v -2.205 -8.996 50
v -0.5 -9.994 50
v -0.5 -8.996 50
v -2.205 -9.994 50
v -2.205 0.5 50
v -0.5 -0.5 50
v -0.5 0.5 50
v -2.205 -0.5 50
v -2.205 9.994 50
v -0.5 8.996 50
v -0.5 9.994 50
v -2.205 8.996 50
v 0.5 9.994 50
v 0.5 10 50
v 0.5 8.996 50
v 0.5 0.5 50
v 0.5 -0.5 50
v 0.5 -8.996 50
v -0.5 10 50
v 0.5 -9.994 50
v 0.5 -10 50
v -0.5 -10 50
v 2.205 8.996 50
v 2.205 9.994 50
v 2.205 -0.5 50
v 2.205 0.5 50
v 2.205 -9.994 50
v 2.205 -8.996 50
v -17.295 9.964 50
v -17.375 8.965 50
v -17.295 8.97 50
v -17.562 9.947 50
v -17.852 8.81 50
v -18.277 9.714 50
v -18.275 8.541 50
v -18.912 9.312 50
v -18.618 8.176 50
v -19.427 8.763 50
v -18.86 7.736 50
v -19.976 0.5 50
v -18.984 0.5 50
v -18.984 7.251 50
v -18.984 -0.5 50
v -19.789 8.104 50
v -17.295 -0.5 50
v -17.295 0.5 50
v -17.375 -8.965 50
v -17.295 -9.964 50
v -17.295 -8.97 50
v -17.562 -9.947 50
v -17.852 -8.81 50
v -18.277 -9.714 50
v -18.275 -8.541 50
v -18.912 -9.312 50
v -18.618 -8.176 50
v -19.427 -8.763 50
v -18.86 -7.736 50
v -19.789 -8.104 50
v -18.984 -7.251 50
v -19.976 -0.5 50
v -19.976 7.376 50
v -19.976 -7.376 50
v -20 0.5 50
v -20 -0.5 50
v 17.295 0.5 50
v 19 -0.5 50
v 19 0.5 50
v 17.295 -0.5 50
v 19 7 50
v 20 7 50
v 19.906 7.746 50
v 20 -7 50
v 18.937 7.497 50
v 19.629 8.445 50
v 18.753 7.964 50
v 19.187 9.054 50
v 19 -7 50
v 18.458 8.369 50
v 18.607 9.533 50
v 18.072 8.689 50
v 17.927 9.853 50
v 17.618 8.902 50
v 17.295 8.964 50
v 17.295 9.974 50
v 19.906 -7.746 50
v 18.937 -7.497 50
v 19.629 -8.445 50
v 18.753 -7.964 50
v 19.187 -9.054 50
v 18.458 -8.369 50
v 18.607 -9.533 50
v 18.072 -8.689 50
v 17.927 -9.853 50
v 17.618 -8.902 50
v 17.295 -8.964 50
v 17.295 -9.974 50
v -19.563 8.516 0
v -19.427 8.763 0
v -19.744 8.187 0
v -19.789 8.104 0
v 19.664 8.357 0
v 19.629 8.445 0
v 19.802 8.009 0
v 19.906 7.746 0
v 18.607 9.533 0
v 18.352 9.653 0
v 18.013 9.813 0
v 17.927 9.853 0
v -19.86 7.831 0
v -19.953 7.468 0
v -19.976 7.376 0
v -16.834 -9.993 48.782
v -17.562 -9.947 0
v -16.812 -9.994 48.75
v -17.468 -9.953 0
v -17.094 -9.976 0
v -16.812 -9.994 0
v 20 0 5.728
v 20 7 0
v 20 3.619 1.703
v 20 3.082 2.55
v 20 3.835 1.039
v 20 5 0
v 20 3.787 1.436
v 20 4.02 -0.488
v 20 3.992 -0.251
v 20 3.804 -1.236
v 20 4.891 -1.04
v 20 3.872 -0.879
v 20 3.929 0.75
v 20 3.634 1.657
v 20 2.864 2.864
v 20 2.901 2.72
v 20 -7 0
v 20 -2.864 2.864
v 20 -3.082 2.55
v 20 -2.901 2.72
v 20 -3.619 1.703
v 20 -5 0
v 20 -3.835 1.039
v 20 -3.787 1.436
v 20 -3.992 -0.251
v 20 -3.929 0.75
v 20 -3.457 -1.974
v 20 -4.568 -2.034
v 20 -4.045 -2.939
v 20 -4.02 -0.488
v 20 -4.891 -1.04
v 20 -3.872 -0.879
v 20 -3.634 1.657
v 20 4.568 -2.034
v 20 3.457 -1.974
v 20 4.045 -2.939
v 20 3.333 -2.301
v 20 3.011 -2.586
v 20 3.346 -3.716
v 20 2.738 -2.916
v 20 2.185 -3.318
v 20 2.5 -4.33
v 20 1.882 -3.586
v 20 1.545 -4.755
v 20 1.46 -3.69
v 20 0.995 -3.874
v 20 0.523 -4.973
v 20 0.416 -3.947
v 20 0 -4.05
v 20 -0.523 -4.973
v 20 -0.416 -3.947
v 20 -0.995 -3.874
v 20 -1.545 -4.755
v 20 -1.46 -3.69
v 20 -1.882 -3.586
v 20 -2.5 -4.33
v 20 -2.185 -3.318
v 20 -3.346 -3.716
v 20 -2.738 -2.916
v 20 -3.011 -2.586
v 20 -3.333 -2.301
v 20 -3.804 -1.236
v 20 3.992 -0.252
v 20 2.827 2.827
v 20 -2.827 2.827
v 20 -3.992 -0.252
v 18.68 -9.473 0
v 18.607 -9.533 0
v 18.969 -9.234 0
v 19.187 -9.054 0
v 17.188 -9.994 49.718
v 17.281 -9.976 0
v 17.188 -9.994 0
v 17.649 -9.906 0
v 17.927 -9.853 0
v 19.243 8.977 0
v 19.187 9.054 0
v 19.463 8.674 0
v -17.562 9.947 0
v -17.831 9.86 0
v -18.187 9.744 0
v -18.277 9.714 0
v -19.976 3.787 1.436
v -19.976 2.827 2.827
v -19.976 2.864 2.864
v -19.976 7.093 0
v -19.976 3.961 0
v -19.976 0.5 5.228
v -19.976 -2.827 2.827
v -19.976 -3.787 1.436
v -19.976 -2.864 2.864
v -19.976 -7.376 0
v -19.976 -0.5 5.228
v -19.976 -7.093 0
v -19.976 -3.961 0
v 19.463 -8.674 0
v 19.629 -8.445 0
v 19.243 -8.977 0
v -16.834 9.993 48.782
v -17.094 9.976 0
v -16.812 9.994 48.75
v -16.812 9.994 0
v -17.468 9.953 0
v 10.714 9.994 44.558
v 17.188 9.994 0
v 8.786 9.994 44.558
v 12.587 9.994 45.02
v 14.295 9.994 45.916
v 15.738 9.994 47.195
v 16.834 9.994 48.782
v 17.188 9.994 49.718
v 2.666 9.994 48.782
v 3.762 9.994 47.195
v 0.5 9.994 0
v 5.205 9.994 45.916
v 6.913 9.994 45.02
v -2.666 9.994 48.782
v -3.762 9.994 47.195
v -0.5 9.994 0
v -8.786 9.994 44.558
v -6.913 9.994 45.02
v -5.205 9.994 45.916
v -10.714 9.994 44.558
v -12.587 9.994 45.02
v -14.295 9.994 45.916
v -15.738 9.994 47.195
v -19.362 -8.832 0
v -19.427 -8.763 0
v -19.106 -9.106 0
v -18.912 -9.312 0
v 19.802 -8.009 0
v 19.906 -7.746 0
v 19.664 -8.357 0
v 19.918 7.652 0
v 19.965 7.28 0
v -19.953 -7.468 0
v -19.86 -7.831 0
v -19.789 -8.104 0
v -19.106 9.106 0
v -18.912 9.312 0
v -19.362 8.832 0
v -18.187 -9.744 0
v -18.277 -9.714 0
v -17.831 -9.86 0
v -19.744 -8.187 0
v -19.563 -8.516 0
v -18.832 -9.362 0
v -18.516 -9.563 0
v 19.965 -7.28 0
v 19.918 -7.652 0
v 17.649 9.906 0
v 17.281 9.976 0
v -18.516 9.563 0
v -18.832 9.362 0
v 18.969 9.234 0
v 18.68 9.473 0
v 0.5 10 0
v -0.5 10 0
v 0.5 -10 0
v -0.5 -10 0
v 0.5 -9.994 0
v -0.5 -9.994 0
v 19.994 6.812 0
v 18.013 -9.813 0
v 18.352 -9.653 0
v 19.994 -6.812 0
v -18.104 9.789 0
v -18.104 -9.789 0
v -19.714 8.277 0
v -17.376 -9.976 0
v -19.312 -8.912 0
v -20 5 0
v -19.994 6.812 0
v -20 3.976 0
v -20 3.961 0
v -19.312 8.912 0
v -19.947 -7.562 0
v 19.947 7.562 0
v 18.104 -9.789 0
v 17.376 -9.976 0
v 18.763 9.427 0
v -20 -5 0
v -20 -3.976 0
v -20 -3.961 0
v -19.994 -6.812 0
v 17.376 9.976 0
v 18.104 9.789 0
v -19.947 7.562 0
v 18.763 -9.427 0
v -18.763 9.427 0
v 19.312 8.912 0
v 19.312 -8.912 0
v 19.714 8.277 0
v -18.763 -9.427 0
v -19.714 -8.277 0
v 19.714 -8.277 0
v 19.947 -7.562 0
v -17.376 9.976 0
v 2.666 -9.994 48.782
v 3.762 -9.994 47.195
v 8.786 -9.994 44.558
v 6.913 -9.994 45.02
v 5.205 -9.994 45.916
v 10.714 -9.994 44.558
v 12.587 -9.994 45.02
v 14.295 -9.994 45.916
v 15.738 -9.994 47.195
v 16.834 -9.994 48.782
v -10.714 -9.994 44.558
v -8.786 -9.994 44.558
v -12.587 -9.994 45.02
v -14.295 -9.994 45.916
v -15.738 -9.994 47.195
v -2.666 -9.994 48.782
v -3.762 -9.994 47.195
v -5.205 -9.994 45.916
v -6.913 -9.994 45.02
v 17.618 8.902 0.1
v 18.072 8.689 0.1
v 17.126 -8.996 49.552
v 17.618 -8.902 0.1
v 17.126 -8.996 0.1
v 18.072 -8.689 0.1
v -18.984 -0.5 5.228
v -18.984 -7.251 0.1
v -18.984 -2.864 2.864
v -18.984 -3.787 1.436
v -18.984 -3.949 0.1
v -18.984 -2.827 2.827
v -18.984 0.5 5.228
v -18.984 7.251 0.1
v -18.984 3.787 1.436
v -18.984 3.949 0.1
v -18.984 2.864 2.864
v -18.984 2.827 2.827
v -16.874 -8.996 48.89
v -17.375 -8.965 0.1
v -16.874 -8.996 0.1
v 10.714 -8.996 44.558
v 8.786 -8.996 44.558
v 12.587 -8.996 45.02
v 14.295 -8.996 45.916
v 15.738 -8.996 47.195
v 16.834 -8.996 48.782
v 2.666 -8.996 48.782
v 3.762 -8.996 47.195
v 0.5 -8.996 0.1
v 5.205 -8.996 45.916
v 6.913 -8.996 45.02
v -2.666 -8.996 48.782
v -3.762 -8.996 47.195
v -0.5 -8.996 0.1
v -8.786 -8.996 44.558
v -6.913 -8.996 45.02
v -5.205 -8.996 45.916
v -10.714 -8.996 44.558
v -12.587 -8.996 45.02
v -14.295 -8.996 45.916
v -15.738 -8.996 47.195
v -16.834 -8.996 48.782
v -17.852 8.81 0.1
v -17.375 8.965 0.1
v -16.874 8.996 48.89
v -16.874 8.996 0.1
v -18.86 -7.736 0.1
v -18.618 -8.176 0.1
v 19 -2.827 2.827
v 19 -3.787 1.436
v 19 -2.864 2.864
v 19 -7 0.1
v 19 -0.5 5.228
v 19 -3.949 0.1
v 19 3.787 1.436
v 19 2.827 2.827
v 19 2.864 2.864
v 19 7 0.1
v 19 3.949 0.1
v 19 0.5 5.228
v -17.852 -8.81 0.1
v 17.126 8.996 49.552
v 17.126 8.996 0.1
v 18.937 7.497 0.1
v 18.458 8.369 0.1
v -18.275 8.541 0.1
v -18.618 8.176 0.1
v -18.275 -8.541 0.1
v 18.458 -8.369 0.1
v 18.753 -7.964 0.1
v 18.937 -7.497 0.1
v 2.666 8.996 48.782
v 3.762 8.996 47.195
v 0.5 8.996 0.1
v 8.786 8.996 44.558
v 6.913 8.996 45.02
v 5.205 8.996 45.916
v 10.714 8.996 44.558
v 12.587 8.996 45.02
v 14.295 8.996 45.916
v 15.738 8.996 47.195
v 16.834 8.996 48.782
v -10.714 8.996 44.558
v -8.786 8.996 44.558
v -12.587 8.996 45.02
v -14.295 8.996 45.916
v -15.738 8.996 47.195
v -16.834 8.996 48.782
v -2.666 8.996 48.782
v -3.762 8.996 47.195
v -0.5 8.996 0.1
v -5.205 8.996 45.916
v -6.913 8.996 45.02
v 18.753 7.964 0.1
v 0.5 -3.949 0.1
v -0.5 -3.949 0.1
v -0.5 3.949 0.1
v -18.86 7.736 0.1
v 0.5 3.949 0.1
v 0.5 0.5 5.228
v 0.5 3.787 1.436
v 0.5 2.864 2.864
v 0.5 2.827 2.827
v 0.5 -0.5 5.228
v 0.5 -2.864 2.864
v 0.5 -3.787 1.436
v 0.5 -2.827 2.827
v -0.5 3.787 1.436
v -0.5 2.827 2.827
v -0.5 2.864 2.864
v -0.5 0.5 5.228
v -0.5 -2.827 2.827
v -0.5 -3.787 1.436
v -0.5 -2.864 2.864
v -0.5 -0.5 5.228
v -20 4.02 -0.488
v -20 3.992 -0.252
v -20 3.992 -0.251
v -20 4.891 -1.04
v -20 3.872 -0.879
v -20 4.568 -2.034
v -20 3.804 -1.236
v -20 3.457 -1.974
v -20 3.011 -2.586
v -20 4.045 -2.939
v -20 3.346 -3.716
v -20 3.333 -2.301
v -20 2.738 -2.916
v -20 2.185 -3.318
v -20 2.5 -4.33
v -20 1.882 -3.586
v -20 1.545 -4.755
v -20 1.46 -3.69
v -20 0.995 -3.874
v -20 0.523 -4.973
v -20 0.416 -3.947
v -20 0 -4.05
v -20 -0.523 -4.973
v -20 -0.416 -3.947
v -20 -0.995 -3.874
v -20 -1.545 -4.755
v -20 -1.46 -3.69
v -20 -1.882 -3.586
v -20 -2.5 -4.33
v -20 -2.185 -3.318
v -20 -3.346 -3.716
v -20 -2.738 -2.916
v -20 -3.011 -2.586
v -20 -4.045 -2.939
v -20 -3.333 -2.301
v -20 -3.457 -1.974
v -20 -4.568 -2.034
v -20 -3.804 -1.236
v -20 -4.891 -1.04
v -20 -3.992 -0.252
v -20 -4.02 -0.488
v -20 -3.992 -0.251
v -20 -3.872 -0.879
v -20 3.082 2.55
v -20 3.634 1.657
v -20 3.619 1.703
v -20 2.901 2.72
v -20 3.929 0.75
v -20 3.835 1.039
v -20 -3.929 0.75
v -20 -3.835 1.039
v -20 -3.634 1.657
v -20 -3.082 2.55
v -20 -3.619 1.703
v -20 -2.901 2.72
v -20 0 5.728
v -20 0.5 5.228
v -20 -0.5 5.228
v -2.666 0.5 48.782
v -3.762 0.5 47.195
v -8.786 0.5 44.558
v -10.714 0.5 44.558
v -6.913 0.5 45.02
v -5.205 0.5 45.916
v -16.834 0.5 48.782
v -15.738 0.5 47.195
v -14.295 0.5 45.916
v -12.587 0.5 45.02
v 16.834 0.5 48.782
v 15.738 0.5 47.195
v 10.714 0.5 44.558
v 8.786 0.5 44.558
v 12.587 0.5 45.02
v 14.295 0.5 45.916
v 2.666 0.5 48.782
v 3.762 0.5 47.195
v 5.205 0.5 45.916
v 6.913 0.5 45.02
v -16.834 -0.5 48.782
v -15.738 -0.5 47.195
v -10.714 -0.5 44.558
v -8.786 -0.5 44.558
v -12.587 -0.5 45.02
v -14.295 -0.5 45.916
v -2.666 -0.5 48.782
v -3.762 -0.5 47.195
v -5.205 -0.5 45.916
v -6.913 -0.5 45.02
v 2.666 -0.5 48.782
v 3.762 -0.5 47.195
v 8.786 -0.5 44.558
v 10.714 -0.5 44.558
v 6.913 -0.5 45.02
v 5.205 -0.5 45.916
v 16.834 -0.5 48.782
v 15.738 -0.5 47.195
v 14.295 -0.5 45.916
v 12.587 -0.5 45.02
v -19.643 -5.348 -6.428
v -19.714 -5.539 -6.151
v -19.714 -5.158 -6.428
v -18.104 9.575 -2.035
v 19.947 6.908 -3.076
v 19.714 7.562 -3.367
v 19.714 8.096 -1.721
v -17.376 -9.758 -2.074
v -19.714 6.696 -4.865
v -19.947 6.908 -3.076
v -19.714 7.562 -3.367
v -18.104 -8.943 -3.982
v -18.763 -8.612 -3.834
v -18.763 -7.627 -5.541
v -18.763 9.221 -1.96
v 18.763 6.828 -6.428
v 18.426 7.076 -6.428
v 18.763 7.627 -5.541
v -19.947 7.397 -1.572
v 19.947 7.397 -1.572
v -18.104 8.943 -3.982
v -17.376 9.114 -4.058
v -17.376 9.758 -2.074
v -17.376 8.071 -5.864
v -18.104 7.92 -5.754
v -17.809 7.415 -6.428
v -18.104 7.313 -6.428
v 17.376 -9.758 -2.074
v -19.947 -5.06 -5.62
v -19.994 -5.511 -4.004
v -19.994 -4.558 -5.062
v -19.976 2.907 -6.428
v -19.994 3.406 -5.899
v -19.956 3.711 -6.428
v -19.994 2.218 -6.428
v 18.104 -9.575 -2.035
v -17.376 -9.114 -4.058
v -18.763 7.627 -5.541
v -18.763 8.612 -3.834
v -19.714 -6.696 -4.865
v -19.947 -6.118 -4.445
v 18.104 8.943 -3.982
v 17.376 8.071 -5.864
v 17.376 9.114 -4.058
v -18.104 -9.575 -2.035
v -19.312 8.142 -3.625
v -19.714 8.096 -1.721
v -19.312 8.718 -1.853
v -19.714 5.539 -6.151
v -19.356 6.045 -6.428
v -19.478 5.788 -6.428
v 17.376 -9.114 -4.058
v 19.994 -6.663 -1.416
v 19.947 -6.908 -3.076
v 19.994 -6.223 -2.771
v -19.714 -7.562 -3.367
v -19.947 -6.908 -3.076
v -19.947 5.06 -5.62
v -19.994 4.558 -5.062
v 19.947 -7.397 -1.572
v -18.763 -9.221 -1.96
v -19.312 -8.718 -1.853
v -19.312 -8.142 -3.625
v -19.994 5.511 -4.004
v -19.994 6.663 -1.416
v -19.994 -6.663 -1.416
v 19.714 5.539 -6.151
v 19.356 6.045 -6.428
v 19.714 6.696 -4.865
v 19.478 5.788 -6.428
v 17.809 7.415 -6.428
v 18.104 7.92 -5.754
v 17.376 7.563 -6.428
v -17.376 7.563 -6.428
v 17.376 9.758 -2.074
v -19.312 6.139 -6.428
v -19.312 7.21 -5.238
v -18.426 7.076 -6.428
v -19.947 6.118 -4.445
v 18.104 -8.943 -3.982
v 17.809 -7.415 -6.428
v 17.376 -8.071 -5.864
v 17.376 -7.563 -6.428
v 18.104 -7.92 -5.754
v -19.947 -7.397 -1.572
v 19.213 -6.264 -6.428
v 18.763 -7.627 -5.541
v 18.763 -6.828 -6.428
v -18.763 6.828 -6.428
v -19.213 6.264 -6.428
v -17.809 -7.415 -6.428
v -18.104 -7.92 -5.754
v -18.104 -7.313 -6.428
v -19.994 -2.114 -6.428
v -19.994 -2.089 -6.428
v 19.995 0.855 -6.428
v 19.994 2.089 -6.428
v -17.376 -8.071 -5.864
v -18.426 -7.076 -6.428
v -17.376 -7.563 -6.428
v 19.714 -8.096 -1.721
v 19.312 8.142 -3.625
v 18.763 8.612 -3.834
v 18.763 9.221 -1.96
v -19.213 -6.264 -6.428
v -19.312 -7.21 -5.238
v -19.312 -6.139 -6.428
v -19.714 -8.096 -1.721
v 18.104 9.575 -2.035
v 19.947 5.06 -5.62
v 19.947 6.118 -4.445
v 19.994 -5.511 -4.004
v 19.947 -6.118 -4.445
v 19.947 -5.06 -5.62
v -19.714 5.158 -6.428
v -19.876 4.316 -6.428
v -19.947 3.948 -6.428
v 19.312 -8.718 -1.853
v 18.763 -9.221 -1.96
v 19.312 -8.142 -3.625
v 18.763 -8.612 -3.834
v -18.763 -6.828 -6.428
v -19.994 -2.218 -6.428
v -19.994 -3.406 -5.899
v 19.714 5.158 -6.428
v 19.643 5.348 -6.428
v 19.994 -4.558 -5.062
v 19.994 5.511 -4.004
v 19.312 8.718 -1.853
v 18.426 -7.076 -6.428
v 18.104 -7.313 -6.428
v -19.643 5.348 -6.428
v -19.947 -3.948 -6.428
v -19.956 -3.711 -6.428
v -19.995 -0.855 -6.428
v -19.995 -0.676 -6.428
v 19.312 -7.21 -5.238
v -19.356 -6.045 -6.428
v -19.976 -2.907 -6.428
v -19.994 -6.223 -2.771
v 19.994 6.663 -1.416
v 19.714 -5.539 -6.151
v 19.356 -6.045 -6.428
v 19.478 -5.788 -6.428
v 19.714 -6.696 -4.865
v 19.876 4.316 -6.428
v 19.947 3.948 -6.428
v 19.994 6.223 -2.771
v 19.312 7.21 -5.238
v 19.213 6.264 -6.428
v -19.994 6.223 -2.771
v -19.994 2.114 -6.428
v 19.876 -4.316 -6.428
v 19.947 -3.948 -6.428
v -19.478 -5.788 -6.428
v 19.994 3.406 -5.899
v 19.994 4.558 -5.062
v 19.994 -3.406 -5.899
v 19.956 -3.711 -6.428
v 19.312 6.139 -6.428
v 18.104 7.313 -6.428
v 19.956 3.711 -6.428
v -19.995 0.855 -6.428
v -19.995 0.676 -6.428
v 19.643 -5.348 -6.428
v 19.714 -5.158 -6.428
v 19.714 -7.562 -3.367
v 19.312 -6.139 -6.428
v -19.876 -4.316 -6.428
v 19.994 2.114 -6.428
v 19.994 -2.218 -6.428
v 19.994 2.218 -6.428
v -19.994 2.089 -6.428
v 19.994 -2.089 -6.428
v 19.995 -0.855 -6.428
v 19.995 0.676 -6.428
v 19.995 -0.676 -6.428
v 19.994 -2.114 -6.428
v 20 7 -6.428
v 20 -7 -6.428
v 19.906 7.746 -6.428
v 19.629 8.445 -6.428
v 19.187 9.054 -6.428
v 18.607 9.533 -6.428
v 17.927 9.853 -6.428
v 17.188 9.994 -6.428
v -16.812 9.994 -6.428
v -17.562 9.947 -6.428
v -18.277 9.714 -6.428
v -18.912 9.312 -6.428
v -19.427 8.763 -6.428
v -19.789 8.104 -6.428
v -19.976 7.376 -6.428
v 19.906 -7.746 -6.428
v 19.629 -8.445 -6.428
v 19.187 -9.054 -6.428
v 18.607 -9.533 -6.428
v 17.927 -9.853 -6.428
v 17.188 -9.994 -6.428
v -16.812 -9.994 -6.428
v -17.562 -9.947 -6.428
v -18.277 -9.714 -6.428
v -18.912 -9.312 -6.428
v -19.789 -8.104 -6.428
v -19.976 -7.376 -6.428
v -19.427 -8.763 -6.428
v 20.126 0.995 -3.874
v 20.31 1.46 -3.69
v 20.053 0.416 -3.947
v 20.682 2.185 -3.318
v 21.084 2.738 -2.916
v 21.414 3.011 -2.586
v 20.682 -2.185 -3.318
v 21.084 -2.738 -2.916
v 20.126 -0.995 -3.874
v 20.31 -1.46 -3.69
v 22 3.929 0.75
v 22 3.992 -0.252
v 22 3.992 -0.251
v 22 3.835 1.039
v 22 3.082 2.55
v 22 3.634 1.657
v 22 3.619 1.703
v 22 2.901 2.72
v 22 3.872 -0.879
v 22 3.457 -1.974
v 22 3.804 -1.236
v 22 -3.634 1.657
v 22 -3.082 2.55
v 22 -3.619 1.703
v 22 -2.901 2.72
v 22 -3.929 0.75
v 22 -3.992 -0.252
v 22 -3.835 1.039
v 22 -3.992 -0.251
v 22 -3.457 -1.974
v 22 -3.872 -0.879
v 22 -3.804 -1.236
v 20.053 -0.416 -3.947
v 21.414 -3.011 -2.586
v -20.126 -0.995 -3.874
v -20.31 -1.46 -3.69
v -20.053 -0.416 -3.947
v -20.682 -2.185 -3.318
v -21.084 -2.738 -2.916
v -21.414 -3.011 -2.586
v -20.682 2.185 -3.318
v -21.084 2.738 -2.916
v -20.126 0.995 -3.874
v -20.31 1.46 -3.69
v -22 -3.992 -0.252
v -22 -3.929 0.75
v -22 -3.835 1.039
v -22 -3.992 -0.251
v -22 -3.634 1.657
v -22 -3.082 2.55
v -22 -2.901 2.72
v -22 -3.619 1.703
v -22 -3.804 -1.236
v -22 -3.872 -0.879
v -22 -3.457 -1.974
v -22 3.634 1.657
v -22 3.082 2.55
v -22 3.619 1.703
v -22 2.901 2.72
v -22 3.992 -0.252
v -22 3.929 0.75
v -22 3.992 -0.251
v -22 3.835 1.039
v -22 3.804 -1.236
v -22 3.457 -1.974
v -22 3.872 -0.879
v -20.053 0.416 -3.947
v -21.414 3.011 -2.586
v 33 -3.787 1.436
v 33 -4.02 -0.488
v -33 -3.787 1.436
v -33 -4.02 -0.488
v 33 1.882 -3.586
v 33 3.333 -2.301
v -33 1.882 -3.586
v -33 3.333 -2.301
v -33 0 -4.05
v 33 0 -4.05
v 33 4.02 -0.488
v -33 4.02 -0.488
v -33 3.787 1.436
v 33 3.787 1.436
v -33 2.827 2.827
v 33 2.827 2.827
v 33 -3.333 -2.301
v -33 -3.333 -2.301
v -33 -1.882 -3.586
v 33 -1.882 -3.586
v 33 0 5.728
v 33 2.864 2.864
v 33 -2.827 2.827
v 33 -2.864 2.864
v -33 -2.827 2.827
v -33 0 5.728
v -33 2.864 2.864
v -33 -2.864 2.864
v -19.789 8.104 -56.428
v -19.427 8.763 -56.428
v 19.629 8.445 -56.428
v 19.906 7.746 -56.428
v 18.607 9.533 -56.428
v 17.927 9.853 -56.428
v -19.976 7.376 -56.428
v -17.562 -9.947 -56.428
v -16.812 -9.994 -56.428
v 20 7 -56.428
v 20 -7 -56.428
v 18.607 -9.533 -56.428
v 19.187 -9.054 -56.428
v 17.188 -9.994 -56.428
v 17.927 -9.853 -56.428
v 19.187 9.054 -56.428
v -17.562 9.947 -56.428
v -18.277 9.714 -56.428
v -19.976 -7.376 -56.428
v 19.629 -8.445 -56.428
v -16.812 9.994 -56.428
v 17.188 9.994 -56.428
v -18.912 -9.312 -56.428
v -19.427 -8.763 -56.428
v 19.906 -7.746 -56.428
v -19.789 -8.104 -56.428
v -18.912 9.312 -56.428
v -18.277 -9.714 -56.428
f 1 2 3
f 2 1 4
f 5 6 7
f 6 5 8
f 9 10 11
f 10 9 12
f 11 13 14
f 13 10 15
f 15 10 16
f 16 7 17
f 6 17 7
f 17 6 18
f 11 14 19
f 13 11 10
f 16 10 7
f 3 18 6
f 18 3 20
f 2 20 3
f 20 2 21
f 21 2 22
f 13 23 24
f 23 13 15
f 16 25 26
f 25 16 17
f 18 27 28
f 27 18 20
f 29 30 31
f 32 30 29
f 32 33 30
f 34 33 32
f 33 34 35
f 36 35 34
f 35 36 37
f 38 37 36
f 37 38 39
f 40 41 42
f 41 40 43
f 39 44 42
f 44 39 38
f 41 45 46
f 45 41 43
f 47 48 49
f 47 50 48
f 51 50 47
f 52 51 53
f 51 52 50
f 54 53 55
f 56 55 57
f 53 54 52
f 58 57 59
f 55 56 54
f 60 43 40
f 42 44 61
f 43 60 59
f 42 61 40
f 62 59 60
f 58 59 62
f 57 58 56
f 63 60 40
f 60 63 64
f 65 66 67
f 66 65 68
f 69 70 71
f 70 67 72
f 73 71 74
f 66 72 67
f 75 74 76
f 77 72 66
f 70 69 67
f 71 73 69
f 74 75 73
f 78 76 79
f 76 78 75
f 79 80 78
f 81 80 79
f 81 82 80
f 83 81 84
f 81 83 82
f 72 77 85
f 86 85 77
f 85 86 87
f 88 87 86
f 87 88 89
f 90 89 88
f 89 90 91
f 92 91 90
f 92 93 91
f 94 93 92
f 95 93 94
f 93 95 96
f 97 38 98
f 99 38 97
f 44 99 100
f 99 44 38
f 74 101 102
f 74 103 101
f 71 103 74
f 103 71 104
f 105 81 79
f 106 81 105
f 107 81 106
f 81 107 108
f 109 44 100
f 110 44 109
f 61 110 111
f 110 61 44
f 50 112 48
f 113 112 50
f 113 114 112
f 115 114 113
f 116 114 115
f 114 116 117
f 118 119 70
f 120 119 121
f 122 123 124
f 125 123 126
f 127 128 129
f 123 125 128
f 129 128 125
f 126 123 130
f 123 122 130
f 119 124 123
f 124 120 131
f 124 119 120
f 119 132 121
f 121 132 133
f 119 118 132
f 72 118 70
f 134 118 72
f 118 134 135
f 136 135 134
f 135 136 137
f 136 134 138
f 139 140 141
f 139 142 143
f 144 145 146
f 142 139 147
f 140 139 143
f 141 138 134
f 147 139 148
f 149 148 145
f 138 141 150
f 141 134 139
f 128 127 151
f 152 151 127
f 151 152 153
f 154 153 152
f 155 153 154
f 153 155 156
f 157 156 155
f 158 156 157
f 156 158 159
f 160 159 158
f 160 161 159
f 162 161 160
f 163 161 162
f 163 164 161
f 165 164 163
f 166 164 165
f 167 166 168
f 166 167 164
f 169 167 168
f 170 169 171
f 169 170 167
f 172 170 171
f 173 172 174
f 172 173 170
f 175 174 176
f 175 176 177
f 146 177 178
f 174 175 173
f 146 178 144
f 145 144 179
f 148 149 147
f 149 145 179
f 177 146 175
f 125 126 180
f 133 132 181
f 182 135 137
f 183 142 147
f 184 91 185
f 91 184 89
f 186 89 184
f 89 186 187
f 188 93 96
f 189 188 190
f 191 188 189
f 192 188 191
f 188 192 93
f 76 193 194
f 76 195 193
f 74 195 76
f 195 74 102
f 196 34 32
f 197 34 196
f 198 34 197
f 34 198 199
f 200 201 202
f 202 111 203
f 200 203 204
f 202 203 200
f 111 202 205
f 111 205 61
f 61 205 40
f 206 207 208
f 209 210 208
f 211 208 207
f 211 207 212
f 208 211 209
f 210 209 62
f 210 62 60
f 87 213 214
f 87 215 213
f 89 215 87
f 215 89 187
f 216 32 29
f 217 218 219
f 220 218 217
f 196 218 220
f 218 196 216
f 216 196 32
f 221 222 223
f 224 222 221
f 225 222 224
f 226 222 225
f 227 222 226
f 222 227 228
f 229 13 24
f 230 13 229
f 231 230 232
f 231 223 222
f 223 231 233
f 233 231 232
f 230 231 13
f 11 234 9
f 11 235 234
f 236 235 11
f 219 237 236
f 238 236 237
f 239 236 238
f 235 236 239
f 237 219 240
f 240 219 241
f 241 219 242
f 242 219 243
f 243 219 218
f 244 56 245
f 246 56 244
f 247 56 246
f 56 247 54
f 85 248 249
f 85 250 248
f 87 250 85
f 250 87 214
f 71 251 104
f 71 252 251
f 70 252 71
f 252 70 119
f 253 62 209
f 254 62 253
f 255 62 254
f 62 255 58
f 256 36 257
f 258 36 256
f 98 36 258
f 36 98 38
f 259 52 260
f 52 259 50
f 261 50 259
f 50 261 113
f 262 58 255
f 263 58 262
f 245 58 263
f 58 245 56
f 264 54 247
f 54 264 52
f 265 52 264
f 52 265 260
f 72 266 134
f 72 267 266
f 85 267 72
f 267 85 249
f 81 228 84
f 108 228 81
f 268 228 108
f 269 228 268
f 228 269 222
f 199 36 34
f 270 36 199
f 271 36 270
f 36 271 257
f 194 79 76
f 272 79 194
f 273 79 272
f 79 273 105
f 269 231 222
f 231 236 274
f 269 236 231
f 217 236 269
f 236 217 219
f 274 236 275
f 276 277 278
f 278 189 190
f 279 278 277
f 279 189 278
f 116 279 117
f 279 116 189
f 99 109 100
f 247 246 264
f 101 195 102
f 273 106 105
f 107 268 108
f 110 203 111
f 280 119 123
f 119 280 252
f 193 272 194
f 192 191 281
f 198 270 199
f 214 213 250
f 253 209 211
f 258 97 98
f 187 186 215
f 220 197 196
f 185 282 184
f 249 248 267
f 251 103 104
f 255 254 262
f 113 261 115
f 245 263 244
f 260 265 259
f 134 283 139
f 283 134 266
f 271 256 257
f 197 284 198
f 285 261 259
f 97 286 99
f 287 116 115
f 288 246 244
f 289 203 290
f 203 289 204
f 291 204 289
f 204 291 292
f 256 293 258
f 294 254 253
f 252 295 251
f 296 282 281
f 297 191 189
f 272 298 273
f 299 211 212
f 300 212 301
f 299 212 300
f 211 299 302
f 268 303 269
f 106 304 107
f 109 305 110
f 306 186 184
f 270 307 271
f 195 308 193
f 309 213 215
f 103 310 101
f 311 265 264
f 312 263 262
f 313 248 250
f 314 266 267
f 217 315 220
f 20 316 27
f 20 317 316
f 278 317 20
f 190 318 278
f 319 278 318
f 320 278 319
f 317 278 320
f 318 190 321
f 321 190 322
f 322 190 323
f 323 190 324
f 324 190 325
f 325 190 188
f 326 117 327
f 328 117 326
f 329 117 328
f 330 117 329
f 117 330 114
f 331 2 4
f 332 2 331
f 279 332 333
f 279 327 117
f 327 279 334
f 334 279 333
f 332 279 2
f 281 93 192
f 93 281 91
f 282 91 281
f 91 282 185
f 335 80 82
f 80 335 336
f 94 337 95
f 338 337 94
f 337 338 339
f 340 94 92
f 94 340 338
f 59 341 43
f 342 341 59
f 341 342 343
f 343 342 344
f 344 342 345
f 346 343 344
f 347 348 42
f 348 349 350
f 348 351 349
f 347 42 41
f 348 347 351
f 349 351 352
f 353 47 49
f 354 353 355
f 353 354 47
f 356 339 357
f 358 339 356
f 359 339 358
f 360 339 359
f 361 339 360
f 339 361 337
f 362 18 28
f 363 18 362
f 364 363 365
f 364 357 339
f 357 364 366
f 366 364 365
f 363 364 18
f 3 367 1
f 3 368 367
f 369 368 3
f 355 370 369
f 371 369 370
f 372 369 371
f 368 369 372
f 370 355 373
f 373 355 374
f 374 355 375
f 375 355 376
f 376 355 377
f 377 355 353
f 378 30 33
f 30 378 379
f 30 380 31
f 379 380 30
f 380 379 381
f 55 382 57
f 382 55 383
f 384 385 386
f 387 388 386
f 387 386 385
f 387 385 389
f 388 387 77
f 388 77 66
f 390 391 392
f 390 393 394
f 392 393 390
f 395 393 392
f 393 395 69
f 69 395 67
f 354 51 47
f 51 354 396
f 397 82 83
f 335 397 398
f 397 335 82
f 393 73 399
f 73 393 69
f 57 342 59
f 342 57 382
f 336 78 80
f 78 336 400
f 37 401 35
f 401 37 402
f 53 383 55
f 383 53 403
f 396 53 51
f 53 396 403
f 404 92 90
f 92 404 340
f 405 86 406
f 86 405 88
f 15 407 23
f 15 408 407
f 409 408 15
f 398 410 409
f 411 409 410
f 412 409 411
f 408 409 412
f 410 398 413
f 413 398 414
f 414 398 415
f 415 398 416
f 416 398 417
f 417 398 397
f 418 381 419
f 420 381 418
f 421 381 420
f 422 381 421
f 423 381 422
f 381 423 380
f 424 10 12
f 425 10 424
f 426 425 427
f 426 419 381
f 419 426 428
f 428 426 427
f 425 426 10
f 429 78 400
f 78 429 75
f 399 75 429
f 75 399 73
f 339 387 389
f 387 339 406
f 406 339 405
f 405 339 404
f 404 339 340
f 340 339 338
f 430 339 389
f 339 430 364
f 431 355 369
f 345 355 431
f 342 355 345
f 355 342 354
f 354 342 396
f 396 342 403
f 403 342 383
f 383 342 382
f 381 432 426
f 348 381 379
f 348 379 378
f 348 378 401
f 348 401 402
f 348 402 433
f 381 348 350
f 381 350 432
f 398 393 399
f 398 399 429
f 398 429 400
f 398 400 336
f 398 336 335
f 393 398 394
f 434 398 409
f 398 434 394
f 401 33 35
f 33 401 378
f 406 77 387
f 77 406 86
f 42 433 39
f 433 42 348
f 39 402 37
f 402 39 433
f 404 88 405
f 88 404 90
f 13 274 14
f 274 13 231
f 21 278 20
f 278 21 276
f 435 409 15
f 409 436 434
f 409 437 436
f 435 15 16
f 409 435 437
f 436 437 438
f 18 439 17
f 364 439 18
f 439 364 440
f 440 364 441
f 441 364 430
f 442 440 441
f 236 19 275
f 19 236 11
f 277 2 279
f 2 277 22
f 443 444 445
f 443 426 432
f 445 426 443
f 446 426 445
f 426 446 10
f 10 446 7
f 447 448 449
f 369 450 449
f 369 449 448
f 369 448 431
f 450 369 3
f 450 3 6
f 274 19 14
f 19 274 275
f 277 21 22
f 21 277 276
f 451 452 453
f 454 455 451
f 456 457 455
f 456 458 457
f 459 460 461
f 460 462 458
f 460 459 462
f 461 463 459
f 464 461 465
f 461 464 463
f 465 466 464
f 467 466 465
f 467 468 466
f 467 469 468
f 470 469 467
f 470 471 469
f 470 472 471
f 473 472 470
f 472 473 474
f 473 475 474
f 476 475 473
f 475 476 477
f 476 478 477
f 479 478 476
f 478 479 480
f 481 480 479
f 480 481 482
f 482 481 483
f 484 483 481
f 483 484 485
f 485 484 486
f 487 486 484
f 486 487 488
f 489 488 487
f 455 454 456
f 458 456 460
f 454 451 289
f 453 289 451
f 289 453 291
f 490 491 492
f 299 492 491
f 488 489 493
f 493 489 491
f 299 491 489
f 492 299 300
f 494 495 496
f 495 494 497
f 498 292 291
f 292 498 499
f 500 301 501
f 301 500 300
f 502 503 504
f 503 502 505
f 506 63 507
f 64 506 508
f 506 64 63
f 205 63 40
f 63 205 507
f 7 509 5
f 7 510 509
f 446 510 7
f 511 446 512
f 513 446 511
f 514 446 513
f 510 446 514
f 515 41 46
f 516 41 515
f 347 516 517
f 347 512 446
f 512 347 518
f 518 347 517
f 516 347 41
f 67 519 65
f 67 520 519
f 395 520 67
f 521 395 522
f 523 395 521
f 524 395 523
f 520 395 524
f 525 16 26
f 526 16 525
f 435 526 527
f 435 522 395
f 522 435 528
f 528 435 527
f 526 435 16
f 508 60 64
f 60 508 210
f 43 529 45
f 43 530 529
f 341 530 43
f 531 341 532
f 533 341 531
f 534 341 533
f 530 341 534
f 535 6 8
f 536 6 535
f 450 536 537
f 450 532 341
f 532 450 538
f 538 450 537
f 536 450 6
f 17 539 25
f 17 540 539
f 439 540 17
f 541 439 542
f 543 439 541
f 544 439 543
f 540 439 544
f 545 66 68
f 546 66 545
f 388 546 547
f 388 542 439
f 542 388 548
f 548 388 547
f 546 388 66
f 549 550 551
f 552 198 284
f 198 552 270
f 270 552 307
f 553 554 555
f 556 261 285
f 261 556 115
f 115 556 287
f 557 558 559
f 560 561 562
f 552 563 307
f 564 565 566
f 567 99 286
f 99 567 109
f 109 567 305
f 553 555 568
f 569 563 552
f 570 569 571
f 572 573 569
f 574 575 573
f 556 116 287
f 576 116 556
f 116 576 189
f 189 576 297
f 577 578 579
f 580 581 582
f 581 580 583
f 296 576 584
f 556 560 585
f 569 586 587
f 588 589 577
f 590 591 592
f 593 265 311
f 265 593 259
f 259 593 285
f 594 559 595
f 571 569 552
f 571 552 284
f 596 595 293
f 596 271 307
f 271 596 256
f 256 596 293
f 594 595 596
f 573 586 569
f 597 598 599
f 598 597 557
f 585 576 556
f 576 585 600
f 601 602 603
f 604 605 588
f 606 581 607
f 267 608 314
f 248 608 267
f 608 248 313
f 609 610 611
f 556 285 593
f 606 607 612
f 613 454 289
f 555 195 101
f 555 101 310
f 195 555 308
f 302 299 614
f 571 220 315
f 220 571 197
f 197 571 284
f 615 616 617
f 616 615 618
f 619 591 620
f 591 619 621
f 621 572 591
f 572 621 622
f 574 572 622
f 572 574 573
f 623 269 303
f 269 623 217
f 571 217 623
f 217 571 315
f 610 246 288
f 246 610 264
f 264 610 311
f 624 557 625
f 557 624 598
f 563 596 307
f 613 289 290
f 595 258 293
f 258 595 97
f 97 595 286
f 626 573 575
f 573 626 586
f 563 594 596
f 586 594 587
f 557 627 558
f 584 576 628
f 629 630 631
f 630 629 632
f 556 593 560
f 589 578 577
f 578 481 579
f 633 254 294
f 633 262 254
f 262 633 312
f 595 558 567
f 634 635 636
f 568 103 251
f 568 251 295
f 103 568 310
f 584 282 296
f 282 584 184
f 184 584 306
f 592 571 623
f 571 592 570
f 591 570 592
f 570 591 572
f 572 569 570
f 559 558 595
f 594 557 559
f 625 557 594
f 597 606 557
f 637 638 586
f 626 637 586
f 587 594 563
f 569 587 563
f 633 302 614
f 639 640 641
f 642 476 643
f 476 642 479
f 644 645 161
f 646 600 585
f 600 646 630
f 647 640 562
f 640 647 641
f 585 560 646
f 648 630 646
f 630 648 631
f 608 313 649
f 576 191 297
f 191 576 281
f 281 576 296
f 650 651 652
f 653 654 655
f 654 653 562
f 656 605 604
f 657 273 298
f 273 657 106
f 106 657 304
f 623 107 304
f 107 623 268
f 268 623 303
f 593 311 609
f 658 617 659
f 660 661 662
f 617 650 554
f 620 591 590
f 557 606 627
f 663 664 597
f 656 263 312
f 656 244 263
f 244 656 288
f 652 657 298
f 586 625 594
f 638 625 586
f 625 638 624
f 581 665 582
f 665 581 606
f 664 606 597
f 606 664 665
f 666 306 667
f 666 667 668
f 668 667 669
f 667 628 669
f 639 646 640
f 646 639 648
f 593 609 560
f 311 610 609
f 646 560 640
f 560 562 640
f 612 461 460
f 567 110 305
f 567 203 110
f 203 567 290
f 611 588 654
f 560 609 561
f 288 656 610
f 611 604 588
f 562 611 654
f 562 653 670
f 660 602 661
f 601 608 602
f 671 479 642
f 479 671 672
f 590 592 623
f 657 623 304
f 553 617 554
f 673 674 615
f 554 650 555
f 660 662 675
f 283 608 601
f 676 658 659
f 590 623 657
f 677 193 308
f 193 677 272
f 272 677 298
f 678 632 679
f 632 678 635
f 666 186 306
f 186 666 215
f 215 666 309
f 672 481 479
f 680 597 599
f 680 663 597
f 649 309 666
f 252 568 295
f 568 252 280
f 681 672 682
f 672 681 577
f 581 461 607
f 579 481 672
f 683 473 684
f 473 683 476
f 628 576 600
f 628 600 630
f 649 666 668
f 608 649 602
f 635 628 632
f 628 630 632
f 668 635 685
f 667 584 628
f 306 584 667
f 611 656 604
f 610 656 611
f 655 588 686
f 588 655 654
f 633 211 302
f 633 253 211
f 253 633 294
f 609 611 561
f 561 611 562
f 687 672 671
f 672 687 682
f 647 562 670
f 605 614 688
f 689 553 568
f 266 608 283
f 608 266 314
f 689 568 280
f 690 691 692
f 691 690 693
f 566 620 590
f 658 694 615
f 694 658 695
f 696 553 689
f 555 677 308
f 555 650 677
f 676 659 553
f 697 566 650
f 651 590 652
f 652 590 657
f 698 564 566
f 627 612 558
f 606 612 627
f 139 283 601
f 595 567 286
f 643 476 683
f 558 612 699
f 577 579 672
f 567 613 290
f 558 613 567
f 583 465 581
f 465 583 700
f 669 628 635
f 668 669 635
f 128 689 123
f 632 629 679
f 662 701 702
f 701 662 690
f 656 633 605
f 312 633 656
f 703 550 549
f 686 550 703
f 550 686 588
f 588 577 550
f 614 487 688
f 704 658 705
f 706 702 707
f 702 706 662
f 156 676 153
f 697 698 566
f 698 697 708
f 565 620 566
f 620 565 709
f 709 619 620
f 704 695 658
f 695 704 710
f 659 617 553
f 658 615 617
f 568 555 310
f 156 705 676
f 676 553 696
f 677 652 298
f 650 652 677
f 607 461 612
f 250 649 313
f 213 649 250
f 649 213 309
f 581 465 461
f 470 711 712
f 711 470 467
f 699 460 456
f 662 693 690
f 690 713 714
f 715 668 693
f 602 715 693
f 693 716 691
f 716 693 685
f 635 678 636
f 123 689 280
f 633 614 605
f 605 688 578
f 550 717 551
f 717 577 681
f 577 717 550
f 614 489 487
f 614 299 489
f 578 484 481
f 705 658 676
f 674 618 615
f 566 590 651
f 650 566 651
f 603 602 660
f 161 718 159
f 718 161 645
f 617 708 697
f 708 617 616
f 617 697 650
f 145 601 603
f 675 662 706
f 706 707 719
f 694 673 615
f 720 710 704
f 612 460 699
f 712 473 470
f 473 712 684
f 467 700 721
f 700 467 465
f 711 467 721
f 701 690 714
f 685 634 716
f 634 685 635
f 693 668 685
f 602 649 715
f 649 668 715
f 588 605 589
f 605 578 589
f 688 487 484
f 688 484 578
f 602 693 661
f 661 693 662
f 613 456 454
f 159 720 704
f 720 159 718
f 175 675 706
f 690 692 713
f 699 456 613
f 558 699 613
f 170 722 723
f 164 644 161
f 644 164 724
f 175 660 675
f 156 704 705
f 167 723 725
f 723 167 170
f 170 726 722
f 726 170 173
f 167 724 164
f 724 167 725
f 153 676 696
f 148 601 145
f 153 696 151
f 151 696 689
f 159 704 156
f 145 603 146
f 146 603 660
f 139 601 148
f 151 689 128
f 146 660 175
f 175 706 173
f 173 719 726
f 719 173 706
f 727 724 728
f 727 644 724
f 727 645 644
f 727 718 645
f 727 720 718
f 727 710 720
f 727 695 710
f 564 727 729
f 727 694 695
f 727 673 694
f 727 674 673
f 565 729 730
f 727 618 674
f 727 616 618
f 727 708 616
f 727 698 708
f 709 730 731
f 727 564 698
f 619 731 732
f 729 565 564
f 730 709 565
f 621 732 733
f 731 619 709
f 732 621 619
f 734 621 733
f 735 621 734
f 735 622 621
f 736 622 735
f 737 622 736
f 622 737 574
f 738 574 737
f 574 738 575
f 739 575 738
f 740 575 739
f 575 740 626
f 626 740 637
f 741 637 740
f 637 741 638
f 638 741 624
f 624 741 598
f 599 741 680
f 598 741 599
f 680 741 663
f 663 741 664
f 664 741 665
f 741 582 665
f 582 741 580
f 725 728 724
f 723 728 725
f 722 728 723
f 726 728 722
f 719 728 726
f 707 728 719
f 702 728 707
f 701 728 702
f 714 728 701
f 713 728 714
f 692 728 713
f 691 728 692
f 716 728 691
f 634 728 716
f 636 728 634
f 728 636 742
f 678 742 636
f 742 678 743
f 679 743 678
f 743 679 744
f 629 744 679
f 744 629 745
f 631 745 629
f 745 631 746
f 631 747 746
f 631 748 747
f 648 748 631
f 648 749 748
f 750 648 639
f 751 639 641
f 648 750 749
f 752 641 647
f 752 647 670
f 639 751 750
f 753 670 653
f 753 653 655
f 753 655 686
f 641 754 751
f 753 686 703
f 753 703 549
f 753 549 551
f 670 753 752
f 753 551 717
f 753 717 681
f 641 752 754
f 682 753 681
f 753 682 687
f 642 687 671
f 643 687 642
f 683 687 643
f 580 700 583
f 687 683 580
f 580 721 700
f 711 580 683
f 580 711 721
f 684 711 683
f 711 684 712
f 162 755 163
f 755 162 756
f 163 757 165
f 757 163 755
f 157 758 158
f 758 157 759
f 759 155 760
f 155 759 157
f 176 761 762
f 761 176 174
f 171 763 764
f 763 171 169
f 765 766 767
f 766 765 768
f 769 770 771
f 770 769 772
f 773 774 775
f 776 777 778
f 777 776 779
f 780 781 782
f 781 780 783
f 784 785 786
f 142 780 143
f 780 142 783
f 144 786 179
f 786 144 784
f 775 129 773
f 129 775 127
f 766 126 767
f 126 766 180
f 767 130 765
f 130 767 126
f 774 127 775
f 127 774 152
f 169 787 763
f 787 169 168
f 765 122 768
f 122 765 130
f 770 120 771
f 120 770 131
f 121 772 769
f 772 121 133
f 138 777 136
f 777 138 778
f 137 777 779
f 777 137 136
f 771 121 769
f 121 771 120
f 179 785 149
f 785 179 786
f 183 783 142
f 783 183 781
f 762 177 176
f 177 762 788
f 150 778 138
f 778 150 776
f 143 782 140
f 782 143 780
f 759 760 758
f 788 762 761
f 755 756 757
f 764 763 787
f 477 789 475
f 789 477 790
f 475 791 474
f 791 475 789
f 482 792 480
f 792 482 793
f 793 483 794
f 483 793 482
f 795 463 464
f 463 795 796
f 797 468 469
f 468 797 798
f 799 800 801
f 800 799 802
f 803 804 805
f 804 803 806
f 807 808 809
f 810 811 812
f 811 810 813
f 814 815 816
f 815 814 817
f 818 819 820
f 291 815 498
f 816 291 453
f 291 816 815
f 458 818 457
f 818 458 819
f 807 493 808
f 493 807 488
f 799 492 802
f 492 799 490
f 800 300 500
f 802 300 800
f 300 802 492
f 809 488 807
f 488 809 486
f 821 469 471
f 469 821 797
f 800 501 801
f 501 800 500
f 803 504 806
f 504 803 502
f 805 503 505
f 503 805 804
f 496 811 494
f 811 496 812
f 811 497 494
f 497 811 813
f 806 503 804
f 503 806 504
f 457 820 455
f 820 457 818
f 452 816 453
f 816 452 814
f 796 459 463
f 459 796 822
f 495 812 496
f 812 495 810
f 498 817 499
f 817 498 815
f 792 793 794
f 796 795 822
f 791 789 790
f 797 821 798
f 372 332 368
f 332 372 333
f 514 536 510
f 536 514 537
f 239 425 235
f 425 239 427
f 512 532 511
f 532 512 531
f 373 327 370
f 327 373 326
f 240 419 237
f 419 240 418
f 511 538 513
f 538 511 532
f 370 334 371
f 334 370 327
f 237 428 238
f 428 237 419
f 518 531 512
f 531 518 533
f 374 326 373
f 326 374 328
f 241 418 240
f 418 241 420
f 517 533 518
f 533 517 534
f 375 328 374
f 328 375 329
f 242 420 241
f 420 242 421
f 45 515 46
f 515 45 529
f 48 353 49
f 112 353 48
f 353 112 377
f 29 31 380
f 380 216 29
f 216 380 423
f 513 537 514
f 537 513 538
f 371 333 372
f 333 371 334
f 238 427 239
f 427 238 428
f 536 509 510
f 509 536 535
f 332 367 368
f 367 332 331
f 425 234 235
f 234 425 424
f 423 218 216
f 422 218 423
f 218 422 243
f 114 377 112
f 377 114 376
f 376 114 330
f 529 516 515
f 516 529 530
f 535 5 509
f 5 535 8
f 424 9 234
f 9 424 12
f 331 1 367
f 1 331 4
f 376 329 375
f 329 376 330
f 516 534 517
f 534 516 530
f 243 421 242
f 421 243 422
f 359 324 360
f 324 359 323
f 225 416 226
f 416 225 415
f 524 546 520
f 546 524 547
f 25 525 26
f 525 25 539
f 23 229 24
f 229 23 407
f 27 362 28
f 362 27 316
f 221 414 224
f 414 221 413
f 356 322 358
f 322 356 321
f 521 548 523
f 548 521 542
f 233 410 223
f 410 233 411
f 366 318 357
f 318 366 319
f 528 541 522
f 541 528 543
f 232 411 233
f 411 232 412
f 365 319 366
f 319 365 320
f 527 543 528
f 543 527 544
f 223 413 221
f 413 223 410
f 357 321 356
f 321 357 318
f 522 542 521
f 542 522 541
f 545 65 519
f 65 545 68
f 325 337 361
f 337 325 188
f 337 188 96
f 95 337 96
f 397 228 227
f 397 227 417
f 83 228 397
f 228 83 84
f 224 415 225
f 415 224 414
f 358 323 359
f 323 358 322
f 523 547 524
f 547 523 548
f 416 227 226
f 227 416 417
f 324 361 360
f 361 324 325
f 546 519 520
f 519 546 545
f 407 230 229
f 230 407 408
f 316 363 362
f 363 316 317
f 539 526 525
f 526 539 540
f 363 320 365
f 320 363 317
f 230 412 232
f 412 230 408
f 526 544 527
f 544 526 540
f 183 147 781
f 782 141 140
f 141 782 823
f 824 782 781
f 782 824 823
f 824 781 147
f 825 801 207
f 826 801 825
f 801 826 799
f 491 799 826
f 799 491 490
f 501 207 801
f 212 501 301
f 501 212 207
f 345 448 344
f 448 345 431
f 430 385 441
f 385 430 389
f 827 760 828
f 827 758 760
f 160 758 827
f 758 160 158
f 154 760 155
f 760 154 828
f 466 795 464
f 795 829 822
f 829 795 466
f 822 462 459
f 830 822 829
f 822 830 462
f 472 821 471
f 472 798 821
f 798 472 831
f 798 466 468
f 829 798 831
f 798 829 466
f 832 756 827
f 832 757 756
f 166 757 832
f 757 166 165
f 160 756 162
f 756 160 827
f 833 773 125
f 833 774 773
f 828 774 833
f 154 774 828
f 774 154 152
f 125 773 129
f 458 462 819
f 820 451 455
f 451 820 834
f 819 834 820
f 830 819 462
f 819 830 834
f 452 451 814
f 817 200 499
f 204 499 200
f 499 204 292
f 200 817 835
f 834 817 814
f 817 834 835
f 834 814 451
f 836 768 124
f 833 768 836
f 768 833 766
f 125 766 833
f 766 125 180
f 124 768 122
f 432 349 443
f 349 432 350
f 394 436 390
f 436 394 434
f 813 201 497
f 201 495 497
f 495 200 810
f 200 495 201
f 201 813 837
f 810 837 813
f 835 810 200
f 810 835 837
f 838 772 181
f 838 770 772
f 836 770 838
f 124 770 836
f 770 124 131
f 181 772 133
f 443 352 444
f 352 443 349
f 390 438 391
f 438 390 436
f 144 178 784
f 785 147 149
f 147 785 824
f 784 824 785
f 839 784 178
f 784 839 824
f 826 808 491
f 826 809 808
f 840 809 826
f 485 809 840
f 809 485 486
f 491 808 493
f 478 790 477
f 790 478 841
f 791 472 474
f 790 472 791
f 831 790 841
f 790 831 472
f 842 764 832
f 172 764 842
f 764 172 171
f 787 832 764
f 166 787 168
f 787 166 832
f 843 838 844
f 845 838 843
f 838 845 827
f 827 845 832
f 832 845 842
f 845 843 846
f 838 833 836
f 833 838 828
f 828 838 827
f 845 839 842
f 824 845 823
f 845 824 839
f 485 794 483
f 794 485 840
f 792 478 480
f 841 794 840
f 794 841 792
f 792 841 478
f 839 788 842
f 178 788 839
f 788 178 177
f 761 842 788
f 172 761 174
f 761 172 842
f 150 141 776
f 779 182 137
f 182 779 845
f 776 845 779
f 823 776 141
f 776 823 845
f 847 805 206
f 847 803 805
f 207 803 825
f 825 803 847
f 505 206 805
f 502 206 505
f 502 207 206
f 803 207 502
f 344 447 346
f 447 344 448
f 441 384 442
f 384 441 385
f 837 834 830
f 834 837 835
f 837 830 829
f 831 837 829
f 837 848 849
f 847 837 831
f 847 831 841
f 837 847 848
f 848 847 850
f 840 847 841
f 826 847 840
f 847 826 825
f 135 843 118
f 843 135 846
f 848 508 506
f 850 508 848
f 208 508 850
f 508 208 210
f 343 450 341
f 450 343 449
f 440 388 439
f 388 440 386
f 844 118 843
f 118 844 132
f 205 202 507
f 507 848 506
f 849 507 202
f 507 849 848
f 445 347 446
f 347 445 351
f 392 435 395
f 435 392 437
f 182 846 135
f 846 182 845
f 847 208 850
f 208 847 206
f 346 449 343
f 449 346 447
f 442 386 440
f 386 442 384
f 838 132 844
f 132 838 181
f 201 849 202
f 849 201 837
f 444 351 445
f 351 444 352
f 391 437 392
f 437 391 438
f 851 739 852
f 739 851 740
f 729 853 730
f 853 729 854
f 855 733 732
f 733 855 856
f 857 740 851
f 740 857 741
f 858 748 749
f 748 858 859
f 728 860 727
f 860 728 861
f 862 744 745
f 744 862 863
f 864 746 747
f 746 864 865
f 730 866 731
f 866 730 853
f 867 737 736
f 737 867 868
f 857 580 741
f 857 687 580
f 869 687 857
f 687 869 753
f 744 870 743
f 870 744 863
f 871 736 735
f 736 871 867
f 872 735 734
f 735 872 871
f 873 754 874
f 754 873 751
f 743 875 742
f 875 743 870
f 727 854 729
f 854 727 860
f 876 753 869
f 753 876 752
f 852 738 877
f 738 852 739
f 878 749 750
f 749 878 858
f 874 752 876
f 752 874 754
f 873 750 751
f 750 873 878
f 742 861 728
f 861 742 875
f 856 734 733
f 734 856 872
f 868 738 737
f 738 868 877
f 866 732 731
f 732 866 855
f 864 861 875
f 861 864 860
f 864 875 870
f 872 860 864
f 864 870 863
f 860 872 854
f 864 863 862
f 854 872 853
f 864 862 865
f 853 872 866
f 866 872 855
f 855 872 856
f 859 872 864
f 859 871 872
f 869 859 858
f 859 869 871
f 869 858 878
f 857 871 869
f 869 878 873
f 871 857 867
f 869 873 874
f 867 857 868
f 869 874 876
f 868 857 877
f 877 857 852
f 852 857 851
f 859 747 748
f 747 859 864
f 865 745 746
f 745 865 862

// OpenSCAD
// file: Divided box.scad
//divided_box(100, 50, 30, 4, 2, 8, 3, 2, 25,0,[1]);
smooth_rect(10,20,30,4);
//Divided box module
//x, y, and z are the size of the box.
//base_ht is the thickness of the base.
//wall_t is the thickness of the walls.
//crad is the radius of the corners. If it's <= 0, the box will have sharp corners.
//If either the base height or the wall thickness are <= 0, the box will be solid.
//x_div and y_div are the numbers of divisions in the box in the x and y directions.
//div_height is the height of the dividers; if <=0, this is set to the height of the box.
//x_skips and y_skips are arrays that list the numbered dividers to skip.

module divided_box(x, y, z,
                    base_ht = 0,
                    wall_t = 0,
                    crad = 0,
                    x_div = 0,
                    y_div = 0,
                    div_height = 0,
                    x_skips = [], y_skips = [])
{
    translate([-x/2, -y/2, 0])
    {
        int_crad = crad - wall_t;
        //Set or clear the divider heights
        divider_height = div_height <=0? z:div_height;
        //Set or clear whether or not the box is solid
        solidbox = ((base_ht <= 0)||(wall_t <= 0))? true:false;
        echo ("Solidbox: ");
        echo (solidbox);
    //    bht = box_base_height;
        difference() {
            //Outside of box:
            smooth_rect(x, y, z,crad);
            //If not a solid box, remove the inside area:
            if (!solidbox)
            {
                translate([crad-int_crad, crad-int_crad, base_ht]) smooth_rect(x - 2*wall_t, y - 2*wall_t, z, int_crad);
            }
        }
        //Add the X dividers
        if (x_div > 0) {
            for(i = [1:x_div])
            {
                skip = len(search(i, x_skips)) > 0? true : false;
                if (!skip)
                {
                    compartment = (x)/(x_div + 1);
                    translate([compartment * i - (wall_t/2),0,0]) cube([wall_t, y, divider_height]);
                }
            }
        }
        if (y_div > 0) {
            for(i = [1:y_div])
            {
                skip = len(search(i, y_skips)) > 0? true : false;
                if (!skip)
                {
                    compartment = (y)/(y_div + 1);
                    translate([0,compartment * i - (wall_t/2),0]) cube([x, wall_t, divider_height]);
                }
            }
        }
    }
}

module smooth_rect(x, y, z, rad)
{
    module corner()
        {
            cylinder(z,rad,rad,$fn=25);
        }
    if (rad > 0)
    {
        hull() {
            translate([rad,rad,0]) corner();
            translate([x-rad,rad,0]) corner();
            translate([rad,y-rad,0]) corner();
            translate([x-rad,y-rad,0]) corner();
        }
    }
    else
    {
        cube([x,y,z]);
    }
}
// main file
//Create a rotatable interior compartment
//flip_compartment(50,40,20, 10, 5);
use <Divided box.scad>;

flip_compartment("add",
                40, 20, 50,
                pip_ht = 2,
                pip_d = 8,
                base_ht = 0.1,
                wall_t = 1,
                crad = 3,
                x_div = 1, y_div = 1,
                div_height = 0,
                x_skips = [], y_skips = [],
                tolerance = 0.1,
                grabhole = [-5.5, 0.8]);
                
#flip_compartment("remove",
                40, 20, 50,
                pip_ht = 2,
                pip_d = 8,
                base_ht = 0.1,
                wall_t = 1,
                crad = 3,
                x_div = 2, y_div = 1,
                div_height = 0,
                x_skips = [], y_skips = [],
                tolerance = 0.1);


module flip_compartment(operation,
                        x, y, z,
                        pip_ht,
                        pip_d,
                        base_ht = 0,
                        wall_t = 0,
                        crad = 0,
                        x_div = 0, y_div = 0,
                        div_height = 0,
                        x_skips = [], y_skips = [],
                        tolerance = 0.1,
                        grabhole = [0, 0.5])
{
    //The "operation" field lets the user specify if they want to add the box or add the area to cut out FOR the box.
    if (operation == "add")
    {
        difference()
        {
            rad_div_box(x, y, z,
                        pip_ht,
                        pip_d,
                        base_ht,
                        wall_t,
                        crad,
                        x_div, y_div,
                        div_height,
                        x_skips, y_skips);
            if (grabhole[1] > 0)
            {
                grab_d = grabhole[1]*x/(x_div+1);
                grab_z_offset = grabhole[0] + z + grab_d/2;
                grab_thick = 2*y;
                grab_ctrdist = z;
                slot_area_w = x-wall_t;
                slot_spacing = slot_area_w/(1+x_div);
                echo("Slot area: ", slot_area_w);
                echo("Slot spacing: ",slot_spacing);
                if (x_div != 0)
                {
                    for (i = [(-slot_area_w + slot_spacing)/2:slot_spacing:(slot_area_w - slot_spacing)/2])
                        translate([i,0,grab_z_offset])
                            {
                                echo(i);
                                grabslot(grab_d, grab_thick, grab_ctrdist);
                            }
                }
                else
                    translate([0,0,grab_z_offset])
                        grabslot(grab_d, grab_thick, grab_ctrdist);
                                
            }
        }
    }
    else    //Generate negative shape to remove
    {
        union()
        {
            ht = 1.5*((pip_ht * 2) + x); //Make sure it's super long to poke through the box.
            dia = (pip_d + tolerance);
            rotate([0, 90, 0])
                teardrop(dia, ht);                      //Nub hole
            translate([0, 0, -(y/2 * cos(50)+(z/2))])
                translate([-x/2, -y/2, -z/2])
                    smooth_rect(x, y, z, crad);         //Support hole for base
        }
    }
}

module grabslot(diameter, thickness, length)
{
    hull()
        {
            rotate([90, 0, 0])
                cylinder(h = thickness, d = diameter, center = true);
            translate([0, 0, length])
                rotate([90, 0, 0])
                    cylinder(h = thickness, d = diameter, center = true);
        }
}

module rad_div_box(x, y, z,
                   pip_ht,
                   pip_d,
                   base_ht = 0,
                   wall_t = 0,
                   crad = 0,
                   x_div = 0, y_div = 0,
                   div_height = 0,
                   x_skips = [], y_skips = [])
{
    union()
    {
        //Box portion:
        divided_box(x, y, z, base_ht, wall_t, crad, x_div, y_div, div_height, x_skips, y_skips);
        //Round portion:
        flat_half_cylinder(x,y/2,crad, 50);
        //Pips:
          rotpat(2)
          {
            translate([x/2,0,0])
                rotate([0,90,0])
                    chamf_cylinder(pip_d, pip_ht);
          }
    }
}

module chamf_cylinder(diameter, height)
{
    difference()
    {
        cylinder(h=height, d=diameter, $fn=25);
        translate([0.5 * diameter,0,height])
            rotate([0,45,0])
                cube([height*sqrt(2), diameter*2,height*sqrt(2)], true);
    }
}

module half_cylinder(length, radius, fillet)
{
    clen = min(length, radius)/2;       //Corner length
    rotate([-90, 0, 90])
        rotate_extrude(angle=180)
            rotate([0,0,180])
                hull()
                {
                    if (fillet > 0)
                    {
                        for (dy = [-(length-2*fillet)/2:length-2*fillet:(length-2*fillet)/2])
                        {
                            translate([-(radius-fillet), dy, 0])
                                circle(r=fillet, $fn=25);
                        }
                    }
                    else
                    {
                        translate([-fillet/2, dy, 0])
                            square(1, true);
                    }
                    for (dy = [-(length-clen)/2:length-clen:(length-clen)/2])
                    {
                        translate([-clen/2, dy, 0])
                            square(clen, true);
                    }
                }
}
module flat_half_cylinder(length, radius, fillet, tan_ang = 45)
{
    difference()
    {
        half_cylinder(length, radius, fillet);
        translate([0, 0, -(radius * cos(tan_ang)+(radius/2))])
            cube([length*2, radius*2, radius], true);
    }
}
module rotpat(instances, totalangle = -1)
{
    dt = totalangle == -1? (360/(instances)):totalangle/(instances-1);
    for (i = [0:(instances-1)])
    {
        rotate([0,0,i*dt])
            children(0);
    }
}

module teardrop (diameter, height)
{
    union()
    {
        cylinder(h = height, d = diameter, center = true);
        sqsize = diameter/2;
        translate([-diameter/(2*sqrt(2)),0,0])
            rotate([0, 0, 45])
                cube([sqsize, sqsize, height], center = true);
    }
}
